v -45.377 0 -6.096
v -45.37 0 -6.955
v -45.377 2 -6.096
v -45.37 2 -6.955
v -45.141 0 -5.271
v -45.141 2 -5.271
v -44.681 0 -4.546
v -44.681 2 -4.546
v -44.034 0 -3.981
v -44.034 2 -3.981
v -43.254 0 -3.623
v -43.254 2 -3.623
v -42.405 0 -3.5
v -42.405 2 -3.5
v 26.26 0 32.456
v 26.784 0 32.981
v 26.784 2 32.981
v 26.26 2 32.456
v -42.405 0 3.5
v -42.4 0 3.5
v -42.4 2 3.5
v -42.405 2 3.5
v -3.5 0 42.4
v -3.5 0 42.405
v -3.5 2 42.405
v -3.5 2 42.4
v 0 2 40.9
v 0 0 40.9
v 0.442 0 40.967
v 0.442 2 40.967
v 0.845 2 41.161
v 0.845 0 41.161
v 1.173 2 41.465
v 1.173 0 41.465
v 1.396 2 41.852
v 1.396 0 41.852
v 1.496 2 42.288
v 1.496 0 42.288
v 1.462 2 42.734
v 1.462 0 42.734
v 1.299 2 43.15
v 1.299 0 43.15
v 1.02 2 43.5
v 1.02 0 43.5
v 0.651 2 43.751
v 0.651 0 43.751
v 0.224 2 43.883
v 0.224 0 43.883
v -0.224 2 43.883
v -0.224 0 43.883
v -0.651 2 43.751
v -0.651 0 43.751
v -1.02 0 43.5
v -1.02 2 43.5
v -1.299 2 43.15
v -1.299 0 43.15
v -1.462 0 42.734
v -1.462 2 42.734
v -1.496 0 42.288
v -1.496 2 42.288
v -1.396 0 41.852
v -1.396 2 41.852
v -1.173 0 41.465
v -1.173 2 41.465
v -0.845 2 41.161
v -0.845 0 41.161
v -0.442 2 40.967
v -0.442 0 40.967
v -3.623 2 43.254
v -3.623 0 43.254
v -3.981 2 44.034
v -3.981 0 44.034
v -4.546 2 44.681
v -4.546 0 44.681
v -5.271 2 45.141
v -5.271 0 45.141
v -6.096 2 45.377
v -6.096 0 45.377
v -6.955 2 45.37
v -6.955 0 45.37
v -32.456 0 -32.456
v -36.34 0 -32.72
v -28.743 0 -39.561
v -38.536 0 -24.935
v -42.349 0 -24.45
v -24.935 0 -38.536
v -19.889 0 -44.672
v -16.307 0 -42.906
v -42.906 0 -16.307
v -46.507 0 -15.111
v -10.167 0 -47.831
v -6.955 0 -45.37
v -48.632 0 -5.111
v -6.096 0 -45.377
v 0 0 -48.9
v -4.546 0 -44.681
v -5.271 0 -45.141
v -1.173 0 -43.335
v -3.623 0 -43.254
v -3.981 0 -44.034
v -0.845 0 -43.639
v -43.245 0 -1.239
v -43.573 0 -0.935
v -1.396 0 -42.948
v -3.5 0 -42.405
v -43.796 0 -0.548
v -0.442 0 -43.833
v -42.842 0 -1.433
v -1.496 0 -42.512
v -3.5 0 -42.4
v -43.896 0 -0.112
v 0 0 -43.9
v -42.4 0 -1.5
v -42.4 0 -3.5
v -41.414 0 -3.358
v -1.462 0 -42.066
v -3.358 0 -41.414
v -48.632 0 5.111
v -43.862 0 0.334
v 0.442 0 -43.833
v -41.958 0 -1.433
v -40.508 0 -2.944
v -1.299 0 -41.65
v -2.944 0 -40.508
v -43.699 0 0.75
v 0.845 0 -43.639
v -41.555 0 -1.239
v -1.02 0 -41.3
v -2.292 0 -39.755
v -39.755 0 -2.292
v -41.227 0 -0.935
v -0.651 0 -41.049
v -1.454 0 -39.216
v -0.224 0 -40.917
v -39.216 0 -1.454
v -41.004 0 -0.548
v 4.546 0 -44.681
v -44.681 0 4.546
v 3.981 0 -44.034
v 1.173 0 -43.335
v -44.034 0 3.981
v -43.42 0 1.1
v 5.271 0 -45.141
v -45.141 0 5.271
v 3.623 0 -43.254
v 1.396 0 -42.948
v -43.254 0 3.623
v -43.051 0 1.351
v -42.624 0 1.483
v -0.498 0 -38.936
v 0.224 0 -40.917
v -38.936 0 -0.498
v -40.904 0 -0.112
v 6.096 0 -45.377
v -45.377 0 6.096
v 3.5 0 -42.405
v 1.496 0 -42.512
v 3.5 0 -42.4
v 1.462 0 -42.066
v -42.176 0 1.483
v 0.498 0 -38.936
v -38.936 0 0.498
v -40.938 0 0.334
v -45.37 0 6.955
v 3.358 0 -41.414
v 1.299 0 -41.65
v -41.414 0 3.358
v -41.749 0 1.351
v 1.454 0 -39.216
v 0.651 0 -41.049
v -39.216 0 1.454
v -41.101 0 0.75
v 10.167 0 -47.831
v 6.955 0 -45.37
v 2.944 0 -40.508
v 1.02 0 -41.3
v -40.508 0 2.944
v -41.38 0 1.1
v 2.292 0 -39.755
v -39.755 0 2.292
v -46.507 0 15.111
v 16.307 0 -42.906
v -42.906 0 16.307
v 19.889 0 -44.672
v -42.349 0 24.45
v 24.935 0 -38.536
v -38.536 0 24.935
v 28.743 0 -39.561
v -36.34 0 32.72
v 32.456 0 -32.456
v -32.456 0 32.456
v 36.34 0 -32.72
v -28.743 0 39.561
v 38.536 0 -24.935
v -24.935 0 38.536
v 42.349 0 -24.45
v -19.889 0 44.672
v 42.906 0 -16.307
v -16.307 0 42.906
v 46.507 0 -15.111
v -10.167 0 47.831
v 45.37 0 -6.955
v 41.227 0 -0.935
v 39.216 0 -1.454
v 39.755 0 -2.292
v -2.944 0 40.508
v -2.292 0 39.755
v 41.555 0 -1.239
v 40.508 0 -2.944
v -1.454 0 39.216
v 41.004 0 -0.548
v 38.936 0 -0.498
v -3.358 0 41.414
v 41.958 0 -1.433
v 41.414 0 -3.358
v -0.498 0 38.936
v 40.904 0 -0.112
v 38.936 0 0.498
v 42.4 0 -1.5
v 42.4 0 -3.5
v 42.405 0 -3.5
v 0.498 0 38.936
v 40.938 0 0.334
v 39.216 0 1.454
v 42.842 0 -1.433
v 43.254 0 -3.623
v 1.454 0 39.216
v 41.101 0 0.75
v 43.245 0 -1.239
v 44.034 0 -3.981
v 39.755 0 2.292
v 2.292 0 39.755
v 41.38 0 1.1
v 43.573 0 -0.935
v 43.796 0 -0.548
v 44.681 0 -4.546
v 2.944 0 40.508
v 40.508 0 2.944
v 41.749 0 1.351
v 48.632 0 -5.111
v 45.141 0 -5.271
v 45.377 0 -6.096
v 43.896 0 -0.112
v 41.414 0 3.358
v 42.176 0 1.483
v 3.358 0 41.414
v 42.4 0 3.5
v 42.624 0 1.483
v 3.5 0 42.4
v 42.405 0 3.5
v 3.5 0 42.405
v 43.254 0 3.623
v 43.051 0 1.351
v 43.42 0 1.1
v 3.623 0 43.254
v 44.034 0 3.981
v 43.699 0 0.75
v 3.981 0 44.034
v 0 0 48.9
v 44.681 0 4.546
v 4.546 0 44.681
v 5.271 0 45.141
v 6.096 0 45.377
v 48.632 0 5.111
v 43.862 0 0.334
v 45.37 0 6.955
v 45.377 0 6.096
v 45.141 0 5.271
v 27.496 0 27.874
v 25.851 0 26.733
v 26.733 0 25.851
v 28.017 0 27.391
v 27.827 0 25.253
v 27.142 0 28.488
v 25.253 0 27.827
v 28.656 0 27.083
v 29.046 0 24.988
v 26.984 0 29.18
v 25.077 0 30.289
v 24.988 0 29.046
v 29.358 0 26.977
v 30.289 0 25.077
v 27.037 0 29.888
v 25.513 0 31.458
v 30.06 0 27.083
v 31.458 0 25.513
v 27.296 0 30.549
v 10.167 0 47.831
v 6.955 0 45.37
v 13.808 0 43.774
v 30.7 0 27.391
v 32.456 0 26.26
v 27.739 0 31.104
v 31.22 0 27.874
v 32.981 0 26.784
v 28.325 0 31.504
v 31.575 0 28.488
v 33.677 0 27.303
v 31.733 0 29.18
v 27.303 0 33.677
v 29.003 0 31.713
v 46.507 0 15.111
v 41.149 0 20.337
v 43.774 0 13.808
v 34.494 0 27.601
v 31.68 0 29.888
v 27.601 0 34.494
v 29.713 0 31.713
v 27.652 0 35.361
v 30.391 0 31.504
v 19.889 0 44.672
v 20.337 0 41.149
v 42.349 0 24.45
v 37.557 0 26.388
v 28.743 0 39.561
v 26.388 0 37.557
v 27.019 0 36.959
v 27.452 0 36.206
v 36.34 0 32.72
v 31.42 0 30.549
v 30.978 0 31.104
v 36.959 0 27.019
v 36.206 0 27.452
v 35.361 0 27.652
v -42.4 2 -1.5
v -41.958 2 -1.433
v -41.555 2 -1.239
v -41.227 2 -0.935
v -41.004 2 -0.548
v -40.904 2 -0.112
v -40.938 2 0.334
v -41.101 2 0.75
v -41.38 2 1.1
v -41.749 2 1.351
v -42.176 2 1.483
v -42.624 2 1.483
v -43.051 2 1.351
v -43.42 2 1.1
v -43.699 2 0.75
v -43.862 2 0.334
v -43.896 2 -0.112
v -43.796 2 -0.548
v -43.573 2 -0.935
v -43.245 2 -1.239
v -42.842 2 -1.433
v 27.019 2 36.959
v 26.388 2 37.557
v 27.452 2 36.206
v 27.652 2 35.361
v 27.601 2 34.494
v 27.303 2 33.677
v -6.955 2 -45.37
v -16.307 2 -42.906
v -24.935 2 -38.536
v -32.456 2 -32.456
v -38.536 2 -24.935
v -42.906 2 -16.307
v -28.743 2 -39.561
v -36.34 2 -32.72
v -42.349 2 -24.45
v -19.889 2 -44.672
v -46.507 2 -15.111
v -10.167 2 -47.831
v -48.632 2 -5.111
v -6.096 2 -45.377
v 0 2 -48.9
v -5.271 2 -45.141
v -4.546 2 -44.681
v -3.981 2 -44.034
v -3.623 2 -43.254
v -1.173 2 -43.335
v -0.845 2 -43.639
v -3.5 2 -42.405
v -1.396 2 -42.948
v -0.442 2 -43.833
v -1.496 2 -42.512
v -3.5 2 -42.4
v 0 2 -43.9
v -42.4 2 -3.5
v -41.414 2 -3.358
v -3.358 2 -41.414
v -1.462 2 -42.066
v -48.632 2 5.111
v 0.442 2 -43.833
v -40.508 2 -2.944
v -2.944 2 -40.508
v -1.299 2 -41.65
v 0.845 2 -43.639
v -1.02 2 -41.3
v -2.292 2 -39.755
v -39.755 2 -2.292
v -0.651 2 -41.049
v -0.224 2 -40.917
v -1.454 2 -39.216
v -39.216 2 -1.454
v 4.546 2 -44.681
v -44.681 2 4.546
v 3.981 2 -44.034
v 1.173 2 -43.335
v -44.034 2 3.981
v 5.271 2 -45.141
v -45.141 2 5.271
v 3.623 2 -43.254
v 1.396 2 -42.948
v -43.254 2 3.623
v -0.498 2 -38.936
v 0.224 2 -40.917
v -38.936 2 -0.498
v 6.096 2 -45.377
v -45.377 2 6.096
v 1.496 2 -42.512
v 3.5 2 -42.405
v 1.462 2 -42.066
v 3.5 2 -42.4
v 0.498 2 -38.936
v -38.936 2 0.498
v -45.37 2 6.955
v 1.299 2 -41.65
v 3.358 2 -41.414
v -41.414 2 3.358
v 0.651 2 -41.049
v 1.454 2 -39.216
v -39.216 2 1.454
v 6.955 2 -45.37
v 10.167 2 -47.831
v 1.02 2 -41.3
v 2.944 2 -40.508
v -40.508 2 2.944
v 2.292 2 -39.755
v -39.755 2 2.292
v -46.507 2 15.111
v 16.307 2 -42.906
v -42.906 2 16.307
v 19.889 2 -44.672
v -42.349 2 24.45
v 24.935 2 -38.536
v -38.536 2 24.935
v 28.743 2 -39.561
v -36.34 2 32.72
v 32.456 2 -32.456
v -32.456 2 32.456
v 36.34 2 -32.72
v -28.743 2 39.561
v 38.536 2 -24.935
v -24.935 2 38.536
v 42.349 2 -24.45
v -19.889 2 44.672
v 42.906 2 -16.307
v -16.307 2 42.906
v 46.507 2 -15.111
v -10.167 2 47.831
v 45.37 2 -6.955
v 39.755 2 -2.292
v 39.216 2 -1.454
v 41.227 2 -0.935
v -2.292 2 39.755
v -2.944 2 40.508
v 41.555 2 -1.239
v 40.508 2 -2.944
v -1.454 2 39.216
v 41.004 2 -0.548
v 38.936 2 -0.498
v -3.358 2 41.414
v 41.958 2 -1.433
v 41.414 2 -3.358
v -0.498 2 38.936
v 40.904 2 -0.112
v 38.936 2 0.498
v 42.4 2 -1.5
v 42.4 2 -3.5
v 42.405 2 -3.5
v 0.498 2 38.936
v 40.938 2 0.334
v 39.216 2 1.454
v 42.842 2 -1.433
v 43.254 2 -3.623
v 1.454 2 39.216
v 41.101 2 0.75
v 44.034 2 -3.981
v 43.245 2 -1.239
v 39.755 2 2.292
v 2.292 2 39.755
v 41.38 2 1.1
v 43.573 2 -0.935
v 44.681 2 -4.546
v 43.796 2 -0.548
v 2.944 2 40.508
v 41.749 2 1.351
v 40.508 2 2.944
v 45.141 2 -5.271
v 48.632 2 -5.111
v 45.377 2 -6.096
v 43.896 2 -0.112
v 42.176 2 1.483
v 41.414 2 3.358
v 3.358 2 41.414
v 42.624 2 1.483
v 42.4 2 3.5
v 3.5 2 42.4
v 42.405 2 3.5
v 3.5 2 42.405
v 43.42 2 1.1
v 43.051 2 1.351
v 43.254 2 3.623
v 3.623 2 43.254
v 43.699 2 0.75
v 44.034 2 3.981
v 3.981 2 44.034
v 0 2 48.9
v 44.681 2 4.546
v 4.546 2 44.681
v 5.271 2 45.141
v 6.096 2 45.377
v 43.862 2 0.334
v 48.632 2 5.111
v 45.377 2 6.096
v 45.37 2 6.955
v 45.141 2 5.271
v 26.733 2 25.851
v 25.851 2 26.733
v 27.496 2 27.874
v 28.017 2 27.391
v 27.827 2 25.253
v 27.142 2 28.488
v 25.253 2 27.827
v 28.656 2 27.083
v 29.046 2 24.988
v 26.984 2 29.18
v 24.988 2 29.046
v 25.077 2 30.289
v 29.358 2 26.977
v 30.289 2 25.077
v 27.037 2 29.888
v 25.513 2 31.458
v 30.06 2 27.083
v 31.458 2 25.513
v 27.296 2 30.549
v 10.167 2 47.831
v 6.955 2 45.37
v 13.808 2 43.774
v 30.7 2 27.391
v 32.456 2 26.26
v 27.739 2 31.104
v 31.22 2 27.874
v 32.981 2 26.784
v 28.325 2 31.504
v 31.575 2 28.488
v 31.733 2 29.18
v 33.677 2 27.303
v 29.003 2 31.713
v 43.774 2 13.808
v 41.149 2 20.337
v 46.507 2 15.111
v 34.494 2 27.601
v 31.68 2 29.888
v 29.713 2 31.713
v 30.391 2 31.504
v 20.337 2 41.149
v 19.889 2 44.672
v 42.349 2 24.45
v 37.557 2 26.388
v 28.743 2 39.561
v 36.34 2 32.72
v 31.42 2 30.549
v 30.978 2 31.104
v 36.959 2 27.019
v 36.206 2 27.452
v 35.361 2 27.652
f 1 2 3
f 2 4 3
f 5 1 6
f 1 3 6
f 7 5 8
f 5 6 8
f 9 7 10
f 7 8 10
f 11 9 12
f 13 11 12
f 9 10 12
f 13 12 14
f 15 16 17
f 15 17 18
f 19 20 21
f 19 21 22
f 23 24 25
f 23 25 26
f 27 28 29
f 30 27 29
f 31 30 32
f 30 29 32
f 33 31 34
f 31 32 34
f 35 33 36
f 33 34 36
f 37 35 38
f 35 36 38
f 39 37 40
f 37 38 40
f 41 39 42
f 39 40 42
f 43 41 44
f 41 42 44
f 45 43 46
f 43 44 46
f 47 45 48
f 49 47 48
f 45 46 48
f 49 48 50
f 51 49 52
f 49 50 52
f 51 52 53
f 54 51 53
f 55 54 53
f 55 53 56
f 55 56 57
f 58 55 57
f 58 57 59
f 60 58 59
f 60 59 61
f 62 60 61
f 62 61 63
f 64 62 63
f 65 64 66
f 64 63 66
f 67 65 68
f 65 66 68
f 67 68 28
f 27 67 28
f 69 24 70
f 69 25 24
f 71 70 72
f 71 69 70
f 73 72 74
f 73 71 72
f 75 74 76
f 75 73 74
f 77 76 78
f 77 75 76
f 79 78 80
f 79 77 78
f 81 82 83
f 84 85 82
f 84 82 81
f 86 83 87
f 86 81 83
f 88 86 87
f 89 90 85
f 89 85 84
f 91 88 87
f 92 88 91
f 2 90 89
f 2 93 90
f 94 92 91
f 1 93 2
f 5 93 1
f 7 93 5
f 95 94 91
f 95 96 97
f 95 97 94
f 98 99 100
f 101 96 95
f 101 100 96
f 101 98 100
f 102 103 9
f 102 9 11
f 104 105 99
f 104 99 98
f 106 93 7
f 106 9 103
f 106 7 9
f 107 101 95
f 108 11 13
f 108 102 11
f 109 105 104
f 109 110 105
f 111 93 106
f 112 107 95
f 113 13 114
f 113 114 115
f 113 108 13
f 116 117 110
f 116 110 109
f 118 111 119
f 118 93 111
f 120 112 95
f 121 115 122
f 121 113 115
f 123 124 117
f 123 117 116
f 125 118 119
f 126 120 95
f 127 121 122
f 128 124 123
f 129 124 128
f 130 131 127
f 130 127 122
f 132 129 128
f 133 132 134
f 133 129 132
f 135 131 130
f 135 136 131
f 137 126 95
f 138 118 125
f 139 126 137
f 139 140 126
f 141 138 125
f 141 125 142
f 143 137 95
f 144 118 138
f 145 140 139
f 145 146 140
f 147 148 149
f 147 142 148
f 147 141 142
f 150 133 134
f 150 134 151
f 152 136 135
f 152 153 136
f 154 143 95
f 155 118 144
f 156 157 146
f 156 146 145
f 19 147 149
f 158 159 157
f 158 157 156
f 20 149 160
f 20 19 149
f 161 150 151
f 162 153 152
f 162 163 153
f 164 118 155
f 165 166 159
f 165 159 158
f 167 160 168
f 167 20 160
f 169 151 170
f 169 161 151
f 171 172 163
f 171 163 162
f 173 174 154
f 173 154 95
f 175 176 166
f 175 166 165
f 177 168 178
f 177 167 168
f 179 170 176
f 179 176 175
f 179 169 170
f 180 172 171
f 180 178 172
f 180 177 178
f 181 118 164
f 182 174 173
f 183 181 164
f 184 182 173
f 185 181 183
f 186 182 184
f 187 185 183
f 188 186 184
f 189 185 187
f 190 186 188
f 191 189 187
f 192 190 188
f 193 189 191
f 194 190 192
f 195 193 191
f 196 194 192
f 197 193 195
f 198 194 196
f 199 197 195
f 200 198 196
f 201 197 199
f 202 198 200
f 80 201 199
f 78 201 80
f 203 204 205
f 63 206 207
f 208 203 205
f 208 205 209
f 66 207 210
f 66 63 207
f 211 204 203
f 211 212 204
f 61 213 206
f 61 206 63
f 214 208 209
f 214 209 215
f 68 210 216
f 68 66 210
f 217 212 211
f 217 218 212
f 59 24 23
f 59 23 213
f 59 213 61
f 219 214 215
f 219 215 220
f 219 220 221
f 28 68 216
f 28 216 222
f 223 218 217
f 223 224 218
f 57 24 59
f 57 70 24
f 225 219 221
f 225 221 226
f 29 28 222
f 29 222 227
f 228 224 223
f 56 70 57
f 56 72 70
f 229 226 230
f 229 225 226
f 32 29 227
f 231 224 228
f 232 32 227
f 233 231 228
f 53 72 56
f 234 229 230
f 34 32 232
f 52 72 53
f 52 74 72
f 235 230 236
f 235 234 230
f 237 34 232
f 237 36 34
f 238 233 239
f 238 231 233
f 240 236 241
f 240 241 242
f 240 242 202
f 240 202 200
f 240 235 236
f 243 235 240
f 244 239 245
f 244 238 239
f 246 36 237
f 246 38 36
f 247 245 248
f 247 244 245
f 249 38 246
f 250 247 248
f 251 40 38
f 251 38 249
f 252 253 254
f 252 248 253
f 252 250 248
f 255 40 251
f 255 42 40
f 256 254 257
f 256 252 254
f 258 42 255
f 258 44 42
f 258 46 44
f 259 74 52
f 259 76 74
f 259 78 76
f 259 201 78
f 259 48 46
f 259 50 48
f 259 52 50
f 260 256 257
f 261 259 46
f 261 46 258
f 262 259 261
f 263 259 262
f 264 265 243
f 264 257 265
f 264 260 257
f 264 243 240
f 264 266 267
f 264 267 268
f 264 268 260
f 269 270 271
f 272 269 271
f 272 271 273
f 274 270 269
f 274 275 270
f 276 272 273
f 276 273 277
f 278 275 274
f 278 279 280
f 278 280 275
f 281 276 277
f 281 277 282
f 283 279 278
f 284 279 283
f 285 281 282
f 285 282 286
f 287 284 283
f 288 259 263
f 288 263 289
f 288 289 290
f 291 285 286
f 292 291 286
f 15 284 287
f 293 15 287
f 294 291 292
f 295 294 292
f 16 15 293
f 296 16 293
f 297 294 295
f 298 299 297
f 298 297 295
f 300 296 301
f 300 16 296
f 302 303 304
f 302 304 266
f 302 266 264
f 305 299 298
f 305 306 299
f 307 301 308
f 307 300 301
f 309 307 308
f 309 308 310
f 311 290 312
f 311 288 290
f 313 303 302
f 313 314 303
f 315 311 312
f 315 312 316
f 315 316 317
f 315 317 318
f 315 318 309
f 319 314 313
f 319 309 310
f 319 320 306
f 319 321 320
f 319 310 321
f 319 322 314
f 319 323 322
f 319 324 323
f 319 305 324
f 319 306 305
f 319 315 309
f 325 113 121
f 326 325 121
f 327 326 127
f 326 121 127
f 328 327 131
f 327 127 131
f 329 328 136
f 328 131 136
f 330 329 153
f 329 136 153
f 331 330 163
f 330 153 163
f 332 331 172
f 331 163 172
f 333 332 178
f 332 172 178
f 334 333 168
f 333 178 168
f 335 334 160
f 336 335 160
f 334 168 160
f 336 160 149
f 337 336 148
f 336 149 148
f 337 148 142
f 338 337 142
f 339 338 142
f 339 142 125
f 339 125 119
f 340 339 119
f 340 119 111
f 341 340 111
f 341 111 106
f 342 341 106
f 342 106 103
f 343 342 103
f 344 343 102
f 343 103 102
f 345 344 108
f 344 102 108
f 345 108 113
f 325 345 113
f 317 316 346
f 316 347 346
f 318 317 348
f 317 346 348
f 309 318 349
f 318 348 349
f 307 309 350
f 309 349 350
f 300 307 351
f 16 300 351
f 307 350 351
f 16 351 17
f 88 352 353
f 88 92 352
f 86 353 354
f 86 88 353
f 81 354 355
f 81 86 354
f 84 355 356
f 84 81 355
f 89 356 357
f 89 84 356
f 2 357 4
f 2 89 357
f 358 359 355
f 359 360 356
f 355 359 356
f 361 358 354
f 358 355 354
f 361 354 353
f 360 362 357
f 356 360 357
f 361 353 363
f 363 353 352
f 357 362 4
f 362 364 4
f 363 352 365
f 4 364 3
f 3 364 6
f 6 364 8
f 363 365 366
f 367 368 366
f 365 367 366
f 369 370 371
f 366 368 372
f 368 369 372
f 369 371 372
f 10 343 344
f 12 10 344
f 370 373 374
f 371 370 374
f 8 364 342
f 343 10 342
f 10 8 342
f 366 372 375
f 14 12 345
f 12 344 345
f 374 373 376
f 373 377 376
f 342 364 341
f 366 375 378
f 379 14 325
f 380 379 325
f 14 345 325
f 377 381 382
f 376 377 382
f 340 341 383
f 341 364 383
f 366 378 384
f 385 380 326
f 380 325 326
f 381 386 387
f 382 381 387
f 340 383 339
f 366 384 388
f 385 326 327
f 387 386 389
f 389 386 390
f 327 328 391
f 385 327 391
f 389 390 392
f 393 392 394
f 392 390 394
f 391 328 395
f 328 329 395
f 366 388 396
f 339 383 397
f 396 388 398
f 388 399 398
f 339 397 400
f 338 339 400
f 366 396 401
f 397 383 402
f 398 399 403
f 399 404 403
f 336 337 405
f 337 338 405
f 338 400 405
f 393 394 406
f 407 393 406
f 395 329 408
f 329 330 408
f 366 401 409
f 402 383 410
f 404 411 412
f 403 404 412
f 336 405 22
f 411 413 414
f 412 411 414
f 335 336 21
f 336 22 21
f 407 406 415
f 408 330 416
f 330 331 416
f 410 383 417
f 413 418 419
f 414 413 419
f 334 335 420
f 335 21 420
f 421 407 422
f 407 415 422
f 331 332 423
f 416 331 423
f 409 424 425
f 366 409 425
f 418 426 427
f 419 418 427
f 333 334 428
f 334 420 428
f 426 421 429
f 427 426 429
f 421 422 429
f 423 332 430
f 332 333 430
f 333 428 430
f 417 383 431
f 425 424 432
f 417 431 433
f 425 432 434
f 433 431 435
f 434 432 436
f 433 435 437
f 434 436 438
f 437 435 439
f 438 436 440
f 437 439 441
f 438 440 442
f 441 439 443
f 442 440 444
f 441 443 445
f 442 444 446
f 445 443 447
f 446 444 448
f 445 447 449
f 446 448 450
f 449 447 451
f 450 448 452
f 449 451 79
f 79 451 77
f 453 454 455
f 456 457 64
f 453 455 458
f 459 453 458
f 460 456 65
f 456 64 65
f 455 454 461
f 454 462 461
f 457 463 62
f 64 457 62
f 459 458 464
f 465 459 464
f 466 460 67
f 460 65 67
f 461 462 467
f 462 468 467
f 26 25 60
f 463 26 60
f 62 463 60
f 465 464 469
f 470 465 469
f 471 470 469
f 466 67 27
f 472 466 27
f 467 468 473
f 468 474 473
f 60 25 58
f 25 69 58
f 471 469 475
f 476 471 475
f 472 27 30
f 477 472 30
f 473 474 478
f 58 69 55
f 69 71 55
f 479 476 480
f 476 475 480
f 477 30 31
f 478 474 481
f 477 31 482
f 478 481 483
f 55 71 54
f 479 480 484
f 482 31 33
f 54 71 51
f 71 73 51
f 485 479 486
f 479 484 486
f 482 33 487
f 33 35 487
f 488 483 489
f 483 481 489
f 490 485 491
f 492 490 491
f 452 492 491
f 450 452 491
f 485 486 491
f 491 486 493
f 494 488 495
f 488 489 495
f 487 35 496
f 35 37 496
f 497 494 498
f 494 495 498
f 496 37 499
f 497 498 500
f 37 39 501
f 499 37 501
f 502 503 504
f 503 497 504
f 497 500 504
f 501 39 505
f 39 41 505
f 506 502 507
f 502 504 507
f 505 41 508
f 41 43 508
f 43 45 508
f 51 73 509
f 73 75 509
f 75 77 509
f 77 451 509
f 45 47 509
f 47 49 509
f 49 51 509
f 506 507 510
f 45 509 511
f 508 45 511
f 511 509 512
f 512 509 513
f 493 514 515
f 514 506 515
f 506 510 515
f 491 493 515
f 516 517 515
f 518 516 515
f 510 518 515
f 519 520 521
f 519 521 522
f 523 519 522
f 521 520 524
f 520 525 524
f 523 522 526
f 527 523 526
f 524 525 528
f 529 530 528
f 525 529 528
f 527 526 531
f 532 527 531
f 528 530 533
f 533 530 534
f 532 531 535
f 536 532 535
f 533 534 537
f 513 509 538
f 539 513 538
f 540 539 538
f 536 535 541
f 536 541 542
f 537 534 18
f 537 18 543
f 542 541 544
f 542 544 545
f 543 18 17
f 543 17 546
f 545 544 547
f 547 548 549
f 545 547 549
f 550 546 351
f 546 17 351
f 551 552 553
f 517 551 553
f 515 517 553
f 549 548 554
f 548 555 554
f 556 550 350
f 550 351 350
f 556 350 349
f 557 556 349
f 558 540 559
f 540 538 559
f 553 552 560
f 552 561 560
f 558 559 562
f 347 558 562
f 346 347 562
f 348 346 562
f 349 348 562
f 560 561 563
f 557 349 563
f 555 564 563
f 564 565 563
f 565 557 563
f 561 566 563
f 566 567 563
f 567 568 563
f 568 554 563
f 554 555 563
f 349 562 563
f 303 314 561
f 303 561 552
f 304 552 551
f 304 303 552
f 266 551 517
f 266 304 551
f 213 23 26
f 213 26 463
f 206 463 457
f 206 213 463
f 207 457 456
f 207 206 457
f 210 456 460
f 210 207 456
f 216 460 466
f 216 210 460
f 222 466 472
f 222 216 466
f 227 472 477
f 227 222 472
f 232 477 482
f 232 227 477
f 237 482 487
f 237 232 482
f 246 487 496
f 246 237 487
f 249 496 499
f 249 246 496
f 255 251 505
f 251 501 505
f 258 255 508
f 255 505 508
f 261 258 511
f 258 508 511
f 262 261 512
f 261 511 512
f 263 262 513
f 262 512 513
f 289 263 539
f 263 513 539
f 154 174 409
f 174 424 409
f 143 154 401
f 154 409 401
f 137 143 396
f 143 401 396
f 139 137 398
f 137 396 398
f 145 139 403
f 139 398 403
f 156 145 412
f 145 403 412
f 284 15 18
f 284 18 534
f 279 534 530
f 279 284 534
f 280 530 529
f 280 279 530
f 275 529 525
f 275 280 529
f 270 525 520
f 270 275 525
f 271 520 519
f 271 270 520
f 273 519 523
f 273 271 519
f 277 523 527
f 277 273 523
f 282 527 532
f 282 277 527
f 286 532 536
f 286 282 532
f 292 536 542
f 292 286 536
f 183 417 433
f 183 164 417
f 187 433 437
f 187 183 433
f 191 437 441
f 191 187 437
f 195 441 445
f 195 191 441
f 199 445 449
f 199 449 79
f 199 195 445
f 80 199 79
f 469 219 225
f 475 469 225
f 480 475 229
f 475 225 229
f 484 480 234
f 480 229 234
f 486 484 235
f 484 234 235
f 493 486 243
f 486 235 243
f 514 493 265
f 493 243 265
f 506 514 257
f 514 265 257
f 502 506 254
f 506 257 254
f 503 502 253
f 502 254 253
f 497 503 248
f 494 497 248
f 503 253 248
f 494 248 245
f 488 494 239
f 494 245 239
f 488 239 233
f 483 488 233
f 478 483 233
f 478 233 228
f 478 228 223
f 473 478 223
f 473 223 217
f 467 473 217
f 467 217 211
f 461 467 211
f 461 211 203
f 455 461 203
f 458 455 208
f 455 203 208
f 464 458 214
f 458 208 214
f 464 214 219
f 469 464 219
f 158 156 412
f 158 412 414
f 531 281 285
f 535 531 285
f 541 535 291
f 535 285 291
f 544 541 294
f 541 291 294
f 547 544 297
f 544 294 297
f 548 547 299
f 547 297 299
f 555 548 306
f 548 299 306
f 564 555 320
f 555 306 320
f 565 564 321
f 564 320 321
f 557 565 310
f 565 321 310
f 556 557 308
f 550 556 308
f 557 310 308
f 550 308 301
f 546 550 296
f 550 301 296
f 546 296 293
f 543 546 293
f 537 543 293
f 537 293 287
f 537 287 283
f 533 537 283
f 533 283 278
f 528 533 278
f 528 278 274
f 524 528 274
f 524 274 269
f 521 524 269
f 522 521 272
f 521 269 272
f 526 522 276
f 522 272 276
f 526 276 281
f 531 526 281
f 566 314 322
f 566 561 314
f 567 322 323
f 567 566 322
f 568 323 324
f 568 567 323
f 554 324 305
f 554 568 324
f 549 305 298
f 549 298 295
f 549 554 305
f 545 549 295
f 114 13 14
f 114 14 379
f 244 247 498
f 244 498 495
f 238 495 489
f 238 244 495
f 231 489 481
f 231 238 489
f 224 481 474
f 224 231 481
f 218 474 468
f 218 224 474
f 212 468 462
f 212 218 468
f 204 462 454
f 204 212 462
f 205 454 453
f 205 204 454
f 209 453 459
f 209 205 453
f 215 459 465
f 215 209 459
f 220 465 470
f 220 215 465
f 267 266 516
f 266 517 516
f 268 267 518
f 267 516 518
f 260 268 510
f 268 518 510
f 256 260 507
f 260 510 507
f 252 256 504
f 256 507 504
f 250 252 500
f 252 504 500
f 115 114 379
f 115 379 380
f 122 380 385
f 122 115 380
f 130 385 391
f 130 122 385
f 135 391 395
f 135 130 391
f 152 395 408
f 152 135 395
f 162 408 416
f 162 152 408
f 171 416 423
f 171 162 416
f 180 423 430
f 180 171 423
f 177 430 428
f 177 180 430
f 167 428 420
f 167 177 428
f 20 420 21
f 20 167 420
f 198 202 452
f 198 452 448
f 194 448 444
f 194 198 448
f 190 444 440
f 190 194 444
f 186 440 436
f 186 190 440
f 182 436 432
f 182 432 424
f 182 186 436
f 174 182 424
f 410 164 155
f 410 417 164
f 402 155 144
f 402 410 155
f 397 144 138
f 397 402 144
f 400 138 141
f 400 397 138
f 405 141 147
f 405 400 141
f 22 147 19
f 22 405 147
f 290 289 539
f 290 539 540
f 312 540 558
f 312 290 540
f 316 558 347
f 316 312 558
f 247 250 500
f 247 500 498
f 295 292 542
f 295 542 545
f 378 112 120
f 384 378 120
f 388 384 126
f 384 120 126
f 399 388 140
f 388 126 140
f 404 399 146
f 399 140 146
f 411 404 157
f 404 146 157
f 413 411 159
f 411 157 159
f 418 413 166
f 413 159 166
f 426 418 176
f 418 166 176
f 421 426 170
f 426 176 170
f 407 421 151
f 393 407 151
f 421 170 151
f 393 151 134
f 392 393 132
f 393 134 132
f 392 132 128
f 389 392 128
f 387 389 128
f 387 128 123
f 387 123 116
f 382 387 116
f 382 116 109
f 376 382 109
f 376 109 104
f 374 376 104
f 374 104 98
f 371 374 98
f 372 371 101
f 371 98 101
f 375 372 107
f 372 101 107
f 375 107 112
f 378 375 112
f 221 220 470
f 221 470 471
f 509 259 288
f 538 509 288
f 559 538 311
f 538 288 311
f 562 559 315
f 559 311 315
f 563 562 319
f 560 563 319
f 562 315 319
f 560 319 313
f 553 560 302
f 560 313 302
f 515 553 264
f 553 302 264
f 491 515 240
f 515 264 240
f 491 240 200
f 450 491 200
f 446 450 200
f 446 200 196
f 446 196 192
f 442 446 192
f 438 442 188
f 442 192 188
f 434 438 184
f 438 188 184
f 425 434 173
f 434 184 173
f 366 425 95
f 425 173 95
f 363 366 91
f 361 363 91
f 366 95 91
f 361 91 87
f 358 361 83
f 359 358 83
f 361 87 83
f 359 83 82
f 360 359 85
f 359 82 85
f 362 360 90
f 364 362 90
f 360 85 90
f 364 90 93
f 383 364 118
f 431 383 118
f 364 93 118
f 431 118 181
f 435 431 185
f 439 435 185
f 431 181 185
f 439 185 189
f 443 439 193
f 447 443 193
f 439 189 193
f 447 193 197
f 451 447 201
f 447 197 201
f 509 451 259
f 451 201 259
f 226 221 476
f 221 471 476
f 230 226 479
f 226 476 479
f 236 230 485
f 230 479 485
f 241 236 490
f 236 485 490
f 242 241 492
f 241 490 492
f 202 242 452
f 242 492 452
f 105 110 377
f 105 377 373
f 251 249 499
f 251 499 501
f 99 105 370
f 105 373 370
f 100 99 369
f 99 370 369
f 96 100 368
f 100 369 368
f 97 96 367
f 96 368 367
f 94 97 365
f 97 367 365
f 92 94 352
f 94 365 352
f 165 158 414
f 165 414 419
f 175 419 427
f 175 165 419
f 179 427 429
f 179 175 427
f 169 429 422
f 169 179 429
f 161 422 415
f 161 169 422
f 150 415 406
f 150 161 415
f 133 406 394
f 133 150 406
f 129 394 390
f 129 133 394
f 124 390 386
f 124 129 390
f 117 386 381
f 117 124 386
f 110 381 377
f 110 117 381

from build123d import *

# Parameters (mm, degrees)
SKETCH1_R           = 48.9
SKETCH1_R_2         = 45.9
BOSS_EXTRUDE1_DEPTH = 2
SKETCH2_R           = 1.5
BOSS_EXTRUDE2_DEPTH = 2
SKETCH3_R           = 2.38125
BOSS_EXTRUDE3_DEPTH = 2
FILLET1_R           = 3


with BuildPart() as part:
    # Sketch1 → Boss-Extrude1 (new body)
    with BuildSketch(Plane(origin=(0, 0, 0), x_dir=(1, 0, 0), z_dir=(0, 1, 0))):
        with Locations(Location((0, 0, 0), (0, 0, 270))):
            Circle(SKETCH1_R)
        with Locations(Location((0, 0, 0), (0, 0, 270))):
            Circle(SKETCH1_R_2, mode=Mode.SUBTRACT)
    extrude(amount=BOSS_EXTRUDE1_DEPTH)

    # Sketch2 → Boss-Extrude2 (add)
    # profile 1 of 4: a face of its own
    with BuildSketch(Plane.XZ):
        with BuildLine():
            Line((-3.5, 45.766363194), (-3.5, 42.4))
            ThreePointArc((-3.5, 42.4), (0, 38.9), (3.5, 42.4))
            Line((3.5, 42.4), (3.5, 45.766363194))
            ThreePointArc((3.5, 45.766363194), (0, 45.9), (-3.5, 45.766363194))
        make_face()
        with Locations(Location((0, 42.4, 0), (0, 0, 270))):
            Circle(SKETCH2_R, mode=Mode.SUBTRACT)
    # profile 2 of 4: a face of its own
    with BuildSketch(Plane.XZ):
        with BuildLine():
            ThreePointArc((45.9, 0), (45.866578631, 1.751275164), (45.766363194, 3.5))
            Line((45.766363194, 3.5), (42.4, 3.5))
            ThreePointArc((42.4, 3.5), (38.9, 0), (42.4, -3.5))
            Line((42.4, -3.5), (45.766363194, -3.5))
            ThreePointArc((45.766363194, -3.5), (45.866578631, -1.751275164), (45.9, 0))
        make_face()
        with Locations(Location((42.4, 0, 0), (0, 0, 270))):
            Circle(SKETCH2_R, mode=Mode.SUBTRACT)
    # profile 3 of 4: a face of its own
    with BuildSketch(Plane.XZ):
        with BuildLine():
            Line((-3.5, -42.4), (-3.5, -45.766363194))
            ThreePointArc((-3.5, -45.766363194), (0, -45.9), (3.5, -45.766363194))
            Line((3.5, -45.766363194), (3.5, -42.4))
            ThreePointArc((3.5, -42.4), (0, -38.9), (-3.5, -42.4))
        make_face()
        with Locations(Location((0, -42.4, 0), (0, 0, 270))):
            Circle(SKETCH2_R, mode=Mode.SUBTRACT)
    # profile 4 of 4: a face of its own
    with BuildSketch(Plane.XZ):
        with BuildLine():
            Line((-42.4, 3.5), (-45.766363194, 3.5))
            ThreePointArc((-45.766363194, 3.5), (-45.9, 0), (-45.766363194, -3.5))
            Line((-45.766363194, -3.5), (-42.4, -3.5))
            ThreePointArc((-42.4, -3.5), (-38.9, 0), (-42.4, 3.5))
        make_face()
        with Locations(Location((-42.4, 0, 0), (0, 0, 270))):
            Circle(SKETCH2_R, mode=Mode.SUBTRACT)
    extrude(amount=-BOSS_EXTRUDE2_DEPTH)

    # Sketch3 → Boss-Extrude3 (add)
    with BuildSketch(Plane.XZ):
        with BuildLine():
            ThreePointArc((35.406018707, 29.209995537), (32.456201256, 32.456201256), (29.209995537, 35.406018707))
            Line((29.209995537, 35.406018707), (26.260178086, 32.456201256))
            ThreePointArc((26.260178086, 32.456201256), (26.260178086, 26.260178086), (32.456201256, 26.260178086))
            Line((32.456201256, 26.260178086), (35.406018707, 29.209995537))
        make_face()
        with Locations(Location((29.358189671, 29.358189671, 0), (0, 0, 270))):
            Circle(SKETCH3_R, mode=Mode.SUBTRACT)
    extrude(amount=-BOSS_EXTRUDE3_DEPTH)

    # Fillet1
    fillet1_edges = [part.edges().sort_by_distance(p)[0] for p in [
        (3.5, 1, 45.766363194),
        (-3.5, 1, 45.766363194),
        (45.766363194, 1, -3.5),
        (45.766363194, 1, 3.5),
        (-3.5, 1, -45.766363194),
        (3.5, 1, -45.766363194),
        (-45.766363194, 1, 3.5),
        (-45.766363194, 1, -3.5),
        (35.406018707, 1, 29.209995537),
        (29.209995537, 1, 35.406018707),
    ]]
    fillet(fillet1_edges, radius=FILLET1_R)


solid = part.part
